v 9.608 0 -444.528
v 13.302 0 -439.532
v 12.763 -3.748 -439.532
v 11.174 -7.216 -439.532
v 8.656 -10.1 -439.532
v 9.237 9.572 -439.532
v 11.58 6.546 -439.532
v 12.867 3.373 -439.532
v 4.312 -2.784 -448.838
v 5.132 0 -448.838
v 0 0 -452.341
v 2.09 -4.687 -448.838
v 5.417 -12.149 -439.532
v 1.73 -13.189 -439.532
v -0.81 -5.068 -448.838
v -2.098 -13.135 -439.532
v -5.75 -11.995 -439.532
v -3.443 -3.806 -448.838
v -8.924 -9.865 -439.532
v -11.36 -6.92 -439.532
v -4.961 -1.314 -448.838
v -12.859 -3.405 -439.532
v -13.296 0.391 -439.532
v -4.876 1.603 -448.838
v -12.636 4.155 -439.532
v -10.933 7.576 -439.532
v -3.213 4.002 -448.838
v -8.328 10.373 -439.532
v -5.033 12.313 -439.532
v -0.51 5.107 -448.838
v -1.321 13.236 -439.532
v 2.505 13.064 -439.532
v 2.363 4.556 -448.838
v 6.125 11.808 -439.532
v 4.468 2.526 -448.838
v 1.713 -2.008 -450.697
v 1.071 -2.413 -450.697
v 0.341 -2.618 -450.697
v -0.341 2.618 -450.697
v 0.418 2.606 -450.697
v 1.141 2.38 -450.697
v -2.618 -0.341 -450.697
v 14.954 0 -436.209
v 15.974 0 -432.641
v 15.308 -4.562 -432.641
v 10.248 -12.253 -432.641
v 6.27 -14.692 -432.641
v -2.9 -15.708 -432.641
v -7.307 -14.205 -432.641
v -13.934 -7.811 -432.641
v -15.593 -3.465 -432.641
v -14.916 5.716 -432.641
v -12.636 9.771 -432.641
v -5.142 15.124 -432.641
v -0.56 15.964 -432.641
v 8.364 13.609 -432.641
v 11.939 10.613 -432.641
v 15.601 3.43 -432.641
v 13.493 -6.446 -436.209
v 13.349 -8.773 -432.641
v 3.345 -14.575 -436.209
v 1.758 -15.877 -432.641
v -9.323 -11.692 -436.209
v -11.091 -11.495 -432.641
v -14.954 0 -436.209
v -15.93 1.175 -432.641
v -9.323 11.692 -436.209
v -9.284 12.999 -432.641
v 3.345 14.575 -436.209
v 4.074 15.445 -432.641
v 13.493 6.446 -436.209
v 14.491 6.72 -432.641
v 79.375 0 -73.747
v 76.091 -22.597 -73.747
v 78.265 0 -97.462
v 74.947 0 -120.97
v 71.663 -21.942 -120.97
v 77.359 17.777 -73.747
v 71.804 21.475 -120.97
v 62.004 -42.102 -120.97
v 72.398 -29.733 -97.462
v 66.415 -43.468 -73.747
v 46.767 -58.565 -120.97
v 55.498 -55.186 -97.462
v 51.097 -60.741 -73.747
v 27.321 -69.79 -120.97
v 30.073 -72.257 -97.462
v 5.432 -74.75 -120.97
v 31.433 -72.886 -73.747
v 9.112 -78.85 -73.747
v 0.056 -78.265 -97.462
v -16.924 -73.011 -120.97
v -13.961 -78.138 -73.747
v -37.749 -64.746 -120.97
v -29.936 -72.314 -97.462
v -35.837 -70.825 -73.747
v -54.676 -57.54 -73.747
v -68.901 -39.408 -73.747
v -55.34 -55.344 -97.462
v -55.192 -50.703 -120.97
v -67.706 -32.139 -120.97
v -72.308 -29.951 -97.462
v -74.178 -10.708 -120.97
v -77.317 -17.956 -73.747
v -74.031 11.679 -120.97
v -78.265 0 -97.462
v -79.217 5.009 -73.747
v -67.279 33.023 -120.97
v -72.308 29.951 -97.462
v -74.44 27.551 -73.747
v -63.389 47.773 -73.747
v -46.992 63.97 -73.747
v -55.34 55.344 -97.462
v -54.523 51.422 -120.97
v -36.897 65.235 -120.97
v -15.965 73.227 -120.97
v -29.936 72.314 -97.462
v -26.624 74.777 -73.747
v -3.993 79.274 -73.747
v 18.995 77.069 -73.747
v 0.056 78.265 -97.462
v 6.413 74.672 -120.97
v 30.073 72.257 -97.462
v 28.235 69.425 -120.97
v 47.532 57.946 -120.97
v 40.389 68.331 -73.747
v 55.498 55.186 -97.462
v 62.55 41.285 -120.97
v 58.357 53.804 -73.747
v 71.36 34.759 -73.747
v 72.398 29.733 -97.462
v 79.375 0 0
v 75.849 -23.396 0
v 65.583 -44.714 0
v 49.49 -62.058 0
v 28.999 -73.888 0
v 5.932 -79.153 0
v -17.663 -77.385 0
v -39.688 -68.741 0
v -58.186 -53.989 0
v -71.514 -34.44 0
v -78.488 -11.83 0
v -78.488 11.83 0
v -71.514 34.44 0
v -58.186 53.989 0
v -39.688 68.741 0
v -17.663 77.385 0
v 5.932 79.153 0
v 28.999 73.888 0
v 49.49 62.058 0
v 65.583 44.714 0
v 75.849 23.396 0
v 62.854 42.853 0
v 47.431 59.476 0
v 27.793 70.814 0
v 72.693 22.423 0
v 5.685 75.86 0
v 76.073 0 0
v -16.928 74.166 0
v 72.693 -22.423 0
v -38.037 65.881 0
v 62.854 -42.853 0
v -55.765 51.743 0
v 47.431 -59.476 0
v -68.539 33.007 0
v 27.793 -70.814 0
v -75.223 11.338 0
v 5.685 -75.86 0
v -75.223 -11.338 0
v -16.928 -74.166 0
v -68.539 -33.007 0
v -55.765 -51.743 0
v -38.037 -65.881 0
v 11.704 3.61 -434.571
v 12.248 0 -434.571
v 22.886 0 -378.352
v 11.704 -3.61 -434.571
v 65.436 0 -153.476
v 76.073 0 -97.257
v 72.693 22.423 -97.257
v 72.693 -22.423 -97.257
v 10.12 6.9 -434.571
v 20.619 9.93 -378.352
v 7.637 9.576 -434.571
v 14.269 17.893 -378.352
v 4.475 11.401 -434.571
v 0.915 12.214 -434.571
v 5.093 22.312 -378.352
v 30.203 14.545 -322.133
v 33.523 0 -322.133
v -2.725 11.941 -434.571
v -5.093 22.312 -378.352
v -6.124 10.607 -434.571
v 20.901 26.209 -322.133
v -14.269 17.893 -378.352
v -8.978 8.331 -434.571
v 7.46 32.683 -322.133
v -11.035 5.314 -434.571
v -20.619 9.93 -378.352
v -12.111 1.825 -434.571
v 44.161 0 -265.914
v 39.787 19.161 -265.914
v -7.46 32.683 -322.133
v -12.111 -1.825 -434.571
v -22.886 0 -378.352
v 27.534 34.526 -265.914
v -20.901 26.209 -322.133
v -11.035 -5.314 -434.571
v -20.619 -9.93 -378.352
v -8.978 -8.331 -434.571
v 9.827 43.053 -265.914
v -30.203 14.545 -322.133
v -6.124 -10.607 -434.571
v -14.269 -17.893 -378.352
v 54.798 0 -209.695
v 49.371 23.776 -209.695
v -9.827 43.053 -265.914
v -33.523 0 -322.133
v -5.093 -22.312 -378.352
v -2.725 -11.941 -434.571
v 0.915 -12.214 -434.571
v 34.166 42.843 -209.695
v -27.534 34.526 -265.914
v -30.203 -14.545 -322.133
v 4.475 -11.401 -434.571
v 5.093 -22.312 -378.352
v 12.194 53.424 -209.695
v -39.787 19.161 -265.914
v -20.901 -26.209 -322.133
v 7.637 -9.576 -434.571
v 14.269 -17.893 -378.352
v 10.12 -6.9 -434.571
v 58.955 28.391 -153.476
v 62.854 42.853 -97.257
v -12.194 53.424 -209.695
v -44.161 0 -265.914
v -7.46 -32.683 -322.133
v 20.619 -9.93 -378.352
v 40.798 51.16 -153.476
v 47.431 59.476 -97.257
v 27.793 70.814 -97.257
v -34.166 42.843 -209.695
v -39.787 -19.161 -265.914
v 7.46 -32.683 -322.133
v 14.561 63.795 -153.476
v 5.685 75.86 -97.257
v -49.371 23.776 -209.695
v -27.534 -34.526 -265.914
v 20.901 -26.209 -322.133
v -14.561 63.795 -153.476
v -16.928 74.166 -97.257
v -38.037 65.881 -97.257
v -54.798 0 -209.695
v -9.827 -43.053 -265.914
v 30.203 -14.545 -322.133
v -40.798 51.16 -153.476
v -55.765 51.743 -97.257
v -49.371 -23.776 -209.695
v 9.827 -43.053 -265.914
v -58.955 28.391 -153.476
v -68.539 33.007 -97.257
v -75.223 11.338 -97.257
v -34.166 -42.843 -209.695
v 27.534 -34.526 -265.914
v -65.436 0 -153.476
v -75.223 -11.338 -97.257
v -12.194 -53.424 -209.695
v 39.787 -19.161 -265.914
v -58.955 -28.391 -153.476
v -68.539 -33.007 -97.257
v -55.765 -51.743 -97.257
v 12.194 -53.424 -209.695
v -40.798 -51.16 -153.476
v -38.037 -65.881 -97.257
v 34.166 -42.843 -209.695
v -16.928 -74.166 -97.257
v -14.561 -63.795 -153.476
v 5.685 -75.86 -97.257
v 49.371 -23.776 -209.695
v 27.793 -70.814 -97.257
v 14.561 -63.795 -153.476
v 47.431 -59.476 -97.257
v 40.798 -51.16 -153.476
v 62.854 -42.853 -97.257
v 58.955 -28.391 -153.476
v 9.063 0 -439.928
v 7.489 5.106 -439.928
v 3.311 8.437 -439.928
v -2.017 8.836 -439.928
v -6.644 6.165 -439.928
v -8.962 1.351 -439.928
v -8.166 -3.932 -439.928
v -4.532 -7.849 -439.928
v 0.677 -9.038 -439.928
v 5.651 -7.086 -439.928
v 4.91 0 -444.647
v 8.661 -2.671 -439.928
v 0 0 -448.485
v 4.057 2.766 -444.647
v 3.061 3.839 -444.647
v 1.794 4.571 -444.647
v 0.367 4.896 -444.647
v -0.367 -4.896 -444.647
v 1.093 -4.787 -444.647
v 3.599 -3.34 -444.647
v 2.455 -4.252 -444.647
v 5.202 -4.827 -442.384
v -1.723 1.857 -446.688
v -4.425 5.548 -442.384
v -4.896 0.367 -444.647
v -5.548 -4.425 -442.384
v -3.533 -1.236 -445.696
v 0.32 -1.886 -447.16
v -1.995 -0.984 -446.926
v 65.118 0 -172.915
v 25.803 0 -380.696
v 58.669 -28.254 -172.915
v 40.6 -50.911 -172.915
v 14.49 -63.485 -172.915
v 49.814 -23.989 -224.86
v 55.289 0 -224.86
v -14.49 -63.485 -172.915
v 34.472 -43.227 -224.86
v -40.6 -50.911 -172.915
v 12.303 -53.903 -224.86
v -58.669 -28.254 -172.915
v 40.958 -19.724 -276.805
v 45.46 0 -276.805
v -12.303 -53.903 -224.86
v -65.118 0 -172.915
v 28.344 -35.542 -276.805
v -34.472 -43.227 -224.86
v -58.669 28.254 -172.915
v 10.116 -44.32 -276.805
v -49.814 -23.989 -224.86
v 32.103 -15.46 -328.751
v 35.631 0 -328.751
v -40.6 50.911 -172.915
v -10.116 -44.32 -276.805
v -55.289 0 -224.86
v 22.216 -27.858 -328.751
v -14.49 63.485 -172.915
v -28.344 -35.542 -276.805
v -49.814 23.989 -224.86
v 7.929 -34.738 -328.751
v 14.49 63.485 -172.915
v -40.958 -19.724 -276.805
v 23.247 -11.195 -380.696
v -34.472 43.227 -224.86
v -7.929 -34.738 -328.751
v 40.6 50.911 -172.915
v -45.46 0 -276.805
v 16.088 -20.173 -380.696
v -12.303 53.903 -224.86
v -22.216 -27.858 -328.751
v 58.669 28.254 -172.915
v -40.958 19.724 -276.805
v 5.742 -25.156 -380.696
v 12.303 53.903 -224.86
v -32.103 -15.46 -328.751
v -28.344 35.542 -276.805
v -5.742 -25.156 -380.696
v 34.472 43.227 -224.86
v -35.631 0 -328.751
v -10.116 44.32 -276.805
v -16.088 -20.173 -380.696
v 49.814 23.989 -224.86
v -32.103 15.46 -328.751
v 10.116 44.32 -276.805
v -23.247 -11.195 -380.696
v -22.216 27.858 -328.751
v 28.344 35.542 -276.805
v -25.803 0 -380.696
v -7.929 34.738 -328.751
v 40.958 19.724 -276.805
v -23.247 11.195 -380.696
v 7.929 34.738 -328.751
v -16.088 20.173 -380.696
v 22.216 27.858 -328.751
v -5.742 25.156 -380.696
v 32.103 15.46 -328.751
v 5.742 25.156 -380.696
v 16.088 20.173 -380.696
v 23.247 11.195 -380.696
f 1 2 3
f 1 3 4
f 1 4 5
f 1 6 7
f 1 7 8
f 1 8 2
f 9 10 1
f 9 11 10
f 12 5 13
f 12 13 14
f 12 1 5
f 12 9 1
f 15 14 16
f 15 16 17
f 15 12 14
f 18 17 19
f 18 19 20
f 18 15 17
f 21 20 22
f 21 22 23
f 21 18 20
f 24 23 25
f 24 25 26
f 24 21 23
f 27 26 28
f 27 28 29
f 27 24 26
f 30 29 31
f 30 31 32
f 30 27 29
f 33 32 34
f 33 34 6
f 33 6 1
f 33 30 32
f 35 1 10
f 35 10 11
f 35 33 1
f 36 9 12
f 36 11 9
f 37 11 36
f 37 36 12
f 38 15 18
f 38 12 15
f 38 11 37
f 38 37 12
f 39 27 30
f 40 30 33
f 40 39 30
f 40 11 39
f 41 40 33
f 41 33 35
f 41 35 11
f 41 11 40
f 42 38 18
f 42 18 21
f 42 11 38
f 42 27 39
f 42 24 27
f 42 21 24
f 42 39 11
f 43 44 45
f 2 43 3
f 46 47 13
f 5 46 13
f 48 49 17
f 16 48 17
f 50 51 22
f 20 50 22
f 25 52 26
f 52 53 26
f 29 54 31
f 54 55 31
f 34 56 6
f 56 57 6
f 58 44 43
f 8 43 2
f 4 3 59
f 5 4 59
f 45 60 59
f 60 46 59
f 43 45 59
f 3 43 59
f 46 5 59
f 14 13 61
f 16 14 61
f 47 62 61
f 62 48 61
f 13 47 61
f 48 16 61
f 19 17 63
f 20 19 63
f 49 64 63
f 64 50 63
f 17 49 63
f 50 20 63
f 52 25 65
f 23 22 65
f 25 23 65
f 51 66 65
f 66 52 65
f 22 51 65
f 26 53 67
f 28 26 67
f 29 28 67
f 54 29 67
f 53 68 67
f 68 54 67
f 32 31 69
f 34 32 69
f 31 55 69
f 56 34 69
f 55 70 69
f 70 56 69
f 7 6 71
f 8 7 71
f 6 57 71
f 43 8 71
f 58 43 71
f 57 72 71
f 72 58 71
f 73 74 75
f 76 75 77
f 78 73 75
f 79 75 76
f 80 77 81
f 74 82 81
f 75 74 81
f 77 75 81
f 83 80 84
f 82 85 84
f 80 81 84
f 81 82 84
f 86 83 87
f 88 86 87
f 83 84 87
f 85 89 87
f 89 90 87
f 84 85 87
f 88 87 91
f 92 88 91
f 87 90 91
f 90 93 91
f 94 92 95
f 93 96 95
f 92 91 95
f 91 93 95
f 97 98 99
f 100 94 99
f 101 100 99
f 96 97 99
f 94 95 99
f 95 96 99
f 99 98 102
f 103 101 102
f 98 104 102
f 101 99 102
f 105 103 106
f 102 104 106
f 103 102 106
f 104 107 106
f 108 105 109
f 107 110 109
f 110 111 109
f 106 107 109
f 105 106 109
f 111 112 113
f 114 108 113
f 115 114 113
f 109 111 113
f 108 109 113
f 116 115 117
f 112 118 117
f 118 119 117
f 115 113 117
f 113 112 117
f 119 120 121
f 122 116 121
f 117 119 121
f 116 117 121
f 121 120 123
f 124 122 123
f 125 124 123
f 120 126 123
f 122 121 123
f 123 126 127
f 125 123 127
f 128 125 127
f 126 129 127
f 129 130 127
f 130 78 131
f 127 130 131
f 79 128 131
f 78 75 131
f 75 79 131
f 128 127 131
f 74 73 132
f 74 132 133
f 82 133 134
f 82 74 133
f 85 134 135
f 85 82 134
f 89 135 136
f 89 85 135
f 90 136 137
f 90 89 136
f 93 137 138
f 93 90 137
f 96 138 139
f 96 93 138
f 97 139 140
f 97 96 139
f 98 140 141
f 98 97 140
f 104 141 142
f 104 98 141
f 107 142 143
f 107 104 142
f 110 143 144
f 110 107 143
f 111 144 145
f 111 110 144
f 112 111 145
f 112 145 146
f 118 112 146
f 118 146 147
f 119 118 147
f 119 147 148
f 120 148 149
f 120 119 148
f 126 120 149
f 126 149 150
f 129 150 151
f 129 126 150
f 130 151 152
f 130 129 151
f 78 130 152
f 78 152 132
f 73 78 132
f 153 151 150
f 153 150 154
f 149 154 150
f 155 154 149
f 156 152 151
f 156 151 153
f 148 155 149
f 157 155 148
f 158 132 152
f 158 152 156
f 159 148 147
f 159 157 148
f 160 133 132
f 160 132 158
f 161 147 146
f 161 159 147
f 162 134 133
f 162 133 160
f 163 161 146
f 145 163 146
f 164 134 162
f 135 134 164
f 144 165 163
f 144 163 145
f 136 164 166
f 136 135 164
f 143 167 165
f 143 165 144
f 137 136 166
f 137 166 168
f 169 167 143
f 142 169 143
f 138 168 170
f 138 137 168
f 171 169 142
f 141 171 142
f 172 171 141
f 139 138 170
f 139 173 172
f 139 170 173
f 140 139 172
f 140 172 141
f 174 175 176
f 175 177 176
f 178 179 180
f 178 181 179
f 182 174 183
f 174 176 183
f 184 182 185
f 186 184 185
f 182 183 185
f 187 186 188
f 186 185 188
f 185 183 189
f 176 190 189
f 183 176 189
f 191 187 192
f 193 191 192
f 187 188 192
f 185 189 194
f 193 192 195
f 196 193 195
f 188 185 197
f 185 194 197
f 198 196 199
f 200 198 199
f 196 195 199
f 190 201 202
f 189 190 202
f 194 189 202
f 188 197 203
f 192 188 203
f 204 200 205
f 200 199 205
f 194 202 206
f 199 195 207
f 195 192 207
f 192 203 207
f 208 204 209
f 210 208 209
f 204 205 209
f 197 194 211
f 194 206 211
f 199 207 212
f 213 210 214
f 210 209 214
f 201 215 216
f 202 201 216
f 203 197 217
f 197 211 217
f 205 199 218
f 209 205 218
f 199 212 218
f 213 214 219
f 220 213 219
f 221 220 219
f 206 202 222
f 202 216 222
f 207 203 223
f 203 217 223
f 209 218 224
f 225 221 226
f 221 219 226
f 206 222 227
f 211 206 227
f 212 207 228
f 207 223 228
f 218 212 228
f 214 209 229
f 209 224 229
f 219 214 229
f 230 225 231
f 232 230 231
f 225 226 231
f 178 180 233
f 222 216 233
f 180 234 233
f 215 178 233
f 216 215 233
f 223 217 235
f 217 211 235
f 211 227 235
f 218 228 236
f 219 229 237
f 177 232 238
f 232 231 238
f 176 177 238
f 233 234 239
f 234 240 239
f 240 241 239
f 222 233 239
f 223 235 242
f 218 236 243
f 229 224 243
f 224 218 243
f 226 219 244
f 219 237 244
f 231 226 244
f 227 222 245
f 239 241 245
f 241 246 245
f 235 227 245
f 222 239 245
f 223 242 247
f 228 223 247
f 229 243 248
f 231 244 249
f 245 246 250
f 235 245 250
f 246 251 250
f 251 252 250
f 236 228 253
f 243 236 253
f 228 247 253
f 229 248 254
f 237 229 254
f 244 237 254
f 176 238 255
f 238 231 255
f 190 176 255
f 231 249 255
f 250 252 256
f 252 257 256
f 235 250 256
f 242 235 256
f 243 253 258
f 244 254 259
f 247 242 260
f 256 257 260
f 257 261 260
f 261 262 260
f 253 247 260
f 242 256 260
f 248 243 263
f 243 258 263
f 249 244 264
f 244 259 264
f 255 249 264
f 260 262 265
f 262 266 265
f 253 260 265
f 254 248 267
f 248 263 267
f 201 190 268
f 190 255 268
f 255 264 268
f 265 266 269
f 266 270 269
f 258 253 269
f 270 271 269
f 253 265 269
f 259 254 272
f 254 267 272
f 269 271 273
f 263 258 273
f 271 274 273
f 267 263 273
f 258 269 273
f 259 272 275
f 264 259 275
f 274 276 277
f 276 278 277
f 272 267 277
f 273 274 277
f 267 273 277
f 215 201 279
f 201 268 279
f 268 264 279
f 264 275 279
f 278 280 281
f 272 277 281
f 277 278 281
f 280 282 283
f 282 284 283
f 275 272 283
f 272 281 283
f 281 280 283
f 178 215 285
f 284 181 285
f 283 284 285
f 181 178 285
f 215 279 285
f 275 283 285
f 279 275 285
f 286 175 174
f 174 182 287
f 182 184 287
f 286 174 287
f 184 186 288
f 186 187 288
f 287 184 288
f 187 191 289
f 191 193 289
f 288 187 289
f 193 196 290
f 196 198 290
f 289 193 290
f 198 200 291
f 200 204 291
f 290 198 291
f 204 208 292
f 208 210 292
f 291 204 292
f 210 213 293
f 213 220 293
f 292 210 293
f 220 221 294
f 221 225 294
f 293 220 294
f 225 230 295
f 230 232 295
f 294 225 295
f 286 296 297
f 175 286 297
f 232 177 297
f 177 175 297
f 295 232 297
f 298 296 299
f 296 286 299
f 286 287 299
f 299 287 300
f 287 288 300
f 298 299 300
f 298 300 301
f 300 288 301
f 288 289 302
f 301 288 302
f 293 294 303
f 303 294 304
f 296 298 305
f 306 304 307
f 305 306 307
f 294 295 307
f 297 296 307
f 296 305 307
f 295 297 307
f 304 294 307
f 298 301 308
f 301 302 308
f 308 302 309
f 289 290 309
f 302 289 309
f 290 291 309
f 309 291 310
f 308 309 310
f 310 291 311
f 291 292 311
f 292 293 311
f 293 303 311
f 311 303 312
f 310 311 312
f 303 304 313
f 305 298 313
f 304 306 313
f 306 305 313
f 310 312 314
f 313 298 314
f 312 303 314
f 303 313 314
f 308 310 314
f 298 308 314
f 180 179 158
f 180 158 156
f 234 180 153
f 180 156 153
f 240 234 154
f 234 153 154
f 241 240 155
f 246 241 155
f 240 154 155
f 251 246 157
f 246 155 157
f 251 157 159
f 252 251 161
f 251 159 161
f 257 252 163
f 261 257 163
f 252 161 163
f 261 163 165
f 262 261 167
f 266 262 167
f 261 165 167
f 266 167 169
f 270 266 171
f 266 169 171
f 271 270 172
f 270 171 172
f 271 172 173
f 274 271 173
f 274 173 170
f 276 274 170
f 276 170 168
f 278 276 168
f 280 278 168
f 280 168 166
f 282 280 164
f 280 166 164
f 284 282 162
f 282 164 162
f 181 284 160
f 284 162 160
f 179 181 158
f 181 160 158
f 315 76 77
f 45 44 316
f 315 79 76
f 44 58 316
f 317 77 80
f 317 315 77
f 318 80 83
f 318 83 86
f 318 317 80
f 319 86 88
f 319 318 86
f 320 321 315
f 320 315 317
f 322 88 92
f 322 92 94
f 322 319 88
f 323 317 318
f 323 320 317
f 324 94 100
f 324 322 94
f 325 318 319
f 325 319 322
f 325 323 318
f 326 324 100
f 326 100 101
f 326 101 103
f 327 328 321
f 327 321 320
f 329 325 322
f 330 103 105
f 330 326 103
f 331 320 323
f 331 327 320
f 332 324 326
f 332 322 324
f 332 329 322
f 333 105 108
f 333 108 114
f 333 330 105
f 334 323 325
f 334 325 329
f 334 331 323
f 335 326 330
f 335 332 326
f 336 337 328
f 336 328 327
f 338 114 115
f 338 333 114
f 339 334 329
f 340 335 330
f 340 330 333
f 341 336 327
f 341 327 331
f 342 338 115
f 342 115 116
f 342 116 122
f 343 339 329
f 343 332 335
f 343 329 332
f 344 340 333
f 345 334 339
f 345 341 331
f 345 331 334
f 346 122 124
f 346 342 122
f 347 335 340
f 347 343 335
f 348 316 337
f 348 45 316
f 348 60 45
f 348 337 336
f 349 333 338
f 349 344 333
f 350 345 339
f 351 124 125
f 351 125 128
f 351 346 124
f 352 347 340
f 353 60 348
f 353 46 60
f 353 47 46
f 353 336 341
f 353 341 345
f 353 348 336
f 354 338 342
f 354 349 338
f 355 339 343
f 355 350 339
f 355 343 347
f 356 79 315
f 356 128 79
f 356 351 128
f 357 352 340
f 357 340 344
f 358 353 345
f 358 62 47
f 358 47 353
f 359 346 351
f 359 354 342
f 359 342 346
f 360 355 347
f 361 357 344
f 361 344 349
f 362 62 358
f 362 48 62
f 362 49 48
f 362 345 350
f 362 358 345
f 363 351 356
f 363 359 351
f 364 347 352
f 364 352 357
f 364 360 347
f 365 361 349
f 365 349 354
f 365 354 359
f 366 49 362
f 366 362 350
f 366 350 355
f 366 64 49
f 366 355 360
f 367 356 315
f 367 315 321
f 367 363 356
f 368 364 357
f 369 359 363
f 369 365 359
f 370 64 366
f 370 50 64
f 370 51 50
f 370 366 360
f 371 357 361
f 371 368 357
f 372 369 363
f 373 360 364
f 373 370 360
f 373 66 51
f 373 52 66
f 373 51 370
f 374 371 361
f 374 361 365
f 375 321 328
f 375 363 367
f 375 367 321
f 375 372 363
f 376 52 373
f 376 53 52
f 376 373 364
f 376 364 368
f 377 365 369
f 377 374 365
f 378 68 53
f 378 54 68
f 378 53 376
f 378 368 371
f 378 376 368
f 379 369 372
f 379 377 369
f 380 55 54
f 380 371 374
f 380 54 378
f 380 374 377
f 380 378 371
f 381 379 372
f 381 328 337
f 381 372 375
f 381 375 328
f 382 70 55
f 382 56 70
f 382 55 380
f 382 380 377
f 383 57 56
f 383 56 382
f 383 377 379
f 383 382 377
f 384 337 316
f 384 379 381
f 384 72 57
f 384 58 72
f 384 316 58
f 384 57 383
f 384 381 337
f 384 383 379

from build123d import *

# Parameters (mm, degrees)
FILLET1_R = 254
FILLET2_R = 20.32


# Read off the part's stored shape, not the designer's step: Shell1
with BuildPart() as part:
    # Sketch3 → Revolve1 (revolve)
    with BuildSketch(Plane(origin=(0, 0, 0), x_dir=(1, 0, 0), z_dir=(0, 1, 0))):
        with BuildLine():
            Line((79.375, 0), (79.375, 97.566452781))
            Line((79.375, 97.566452781), (15.414998094, 435.593871211))
            ThreePointArc((15.414998094, 435.593871211), (9.023509201, 445.178624931), (0, 452.340671834))
            Line((0, 452.340671834), (0, 431.8))
            Line((0, 431.8), (0, 0))
            Line((0, 0), (79.375, 0))
        make_face()
    revolve(axis=Axis((0, 0, -20.618215306), (0, 0, -1)))

    # Shell1 outline → Shell1 (revolve, cut)
    with BuildSketch(Plane.XZ):
        with BuildLine():
            add(Edge.make_bspline(
                [(0, -448.485192633), (8.107967388, -443.274294187), (12.248008898, -434.570694124)],
                knots=[5.283607214, 5.283607214, 5.283607214, 5.839190446, 5.839190446, 5.839190446], degree=2, weights=[1, 0.961663394, 1]))
            Line((12.248008898, -434.570694124), (76.073, -97.256805277))
            Line((76.073, -97.256805277), (76.073, 0))
            Line((76.073, 0), (0, 0))
            Line((0, 0), (0, -448.485192633))
        make_face()
    revolve(axis=Axis((0, 0, 0), (0, 0, 1)), mode=Mode.SUBTRACT)

    # Fillet1
    fillet1_edges = [part.edges().sort_by_distance(p)[0] for p in [
        (-79.375, 0, -97.566452781),
    ]]
    fillet(fillet1_edges, radius=FILLET1_R)

    # Fillet2
    fillet2_edges = [part.edges().sort_by_distance(p)[0] for p in [
        (-15.414998094, 0, -435.593871211),
    ]]
    fillet(fillet2_edges, radius=FILLET2_R)


solid = part.part
